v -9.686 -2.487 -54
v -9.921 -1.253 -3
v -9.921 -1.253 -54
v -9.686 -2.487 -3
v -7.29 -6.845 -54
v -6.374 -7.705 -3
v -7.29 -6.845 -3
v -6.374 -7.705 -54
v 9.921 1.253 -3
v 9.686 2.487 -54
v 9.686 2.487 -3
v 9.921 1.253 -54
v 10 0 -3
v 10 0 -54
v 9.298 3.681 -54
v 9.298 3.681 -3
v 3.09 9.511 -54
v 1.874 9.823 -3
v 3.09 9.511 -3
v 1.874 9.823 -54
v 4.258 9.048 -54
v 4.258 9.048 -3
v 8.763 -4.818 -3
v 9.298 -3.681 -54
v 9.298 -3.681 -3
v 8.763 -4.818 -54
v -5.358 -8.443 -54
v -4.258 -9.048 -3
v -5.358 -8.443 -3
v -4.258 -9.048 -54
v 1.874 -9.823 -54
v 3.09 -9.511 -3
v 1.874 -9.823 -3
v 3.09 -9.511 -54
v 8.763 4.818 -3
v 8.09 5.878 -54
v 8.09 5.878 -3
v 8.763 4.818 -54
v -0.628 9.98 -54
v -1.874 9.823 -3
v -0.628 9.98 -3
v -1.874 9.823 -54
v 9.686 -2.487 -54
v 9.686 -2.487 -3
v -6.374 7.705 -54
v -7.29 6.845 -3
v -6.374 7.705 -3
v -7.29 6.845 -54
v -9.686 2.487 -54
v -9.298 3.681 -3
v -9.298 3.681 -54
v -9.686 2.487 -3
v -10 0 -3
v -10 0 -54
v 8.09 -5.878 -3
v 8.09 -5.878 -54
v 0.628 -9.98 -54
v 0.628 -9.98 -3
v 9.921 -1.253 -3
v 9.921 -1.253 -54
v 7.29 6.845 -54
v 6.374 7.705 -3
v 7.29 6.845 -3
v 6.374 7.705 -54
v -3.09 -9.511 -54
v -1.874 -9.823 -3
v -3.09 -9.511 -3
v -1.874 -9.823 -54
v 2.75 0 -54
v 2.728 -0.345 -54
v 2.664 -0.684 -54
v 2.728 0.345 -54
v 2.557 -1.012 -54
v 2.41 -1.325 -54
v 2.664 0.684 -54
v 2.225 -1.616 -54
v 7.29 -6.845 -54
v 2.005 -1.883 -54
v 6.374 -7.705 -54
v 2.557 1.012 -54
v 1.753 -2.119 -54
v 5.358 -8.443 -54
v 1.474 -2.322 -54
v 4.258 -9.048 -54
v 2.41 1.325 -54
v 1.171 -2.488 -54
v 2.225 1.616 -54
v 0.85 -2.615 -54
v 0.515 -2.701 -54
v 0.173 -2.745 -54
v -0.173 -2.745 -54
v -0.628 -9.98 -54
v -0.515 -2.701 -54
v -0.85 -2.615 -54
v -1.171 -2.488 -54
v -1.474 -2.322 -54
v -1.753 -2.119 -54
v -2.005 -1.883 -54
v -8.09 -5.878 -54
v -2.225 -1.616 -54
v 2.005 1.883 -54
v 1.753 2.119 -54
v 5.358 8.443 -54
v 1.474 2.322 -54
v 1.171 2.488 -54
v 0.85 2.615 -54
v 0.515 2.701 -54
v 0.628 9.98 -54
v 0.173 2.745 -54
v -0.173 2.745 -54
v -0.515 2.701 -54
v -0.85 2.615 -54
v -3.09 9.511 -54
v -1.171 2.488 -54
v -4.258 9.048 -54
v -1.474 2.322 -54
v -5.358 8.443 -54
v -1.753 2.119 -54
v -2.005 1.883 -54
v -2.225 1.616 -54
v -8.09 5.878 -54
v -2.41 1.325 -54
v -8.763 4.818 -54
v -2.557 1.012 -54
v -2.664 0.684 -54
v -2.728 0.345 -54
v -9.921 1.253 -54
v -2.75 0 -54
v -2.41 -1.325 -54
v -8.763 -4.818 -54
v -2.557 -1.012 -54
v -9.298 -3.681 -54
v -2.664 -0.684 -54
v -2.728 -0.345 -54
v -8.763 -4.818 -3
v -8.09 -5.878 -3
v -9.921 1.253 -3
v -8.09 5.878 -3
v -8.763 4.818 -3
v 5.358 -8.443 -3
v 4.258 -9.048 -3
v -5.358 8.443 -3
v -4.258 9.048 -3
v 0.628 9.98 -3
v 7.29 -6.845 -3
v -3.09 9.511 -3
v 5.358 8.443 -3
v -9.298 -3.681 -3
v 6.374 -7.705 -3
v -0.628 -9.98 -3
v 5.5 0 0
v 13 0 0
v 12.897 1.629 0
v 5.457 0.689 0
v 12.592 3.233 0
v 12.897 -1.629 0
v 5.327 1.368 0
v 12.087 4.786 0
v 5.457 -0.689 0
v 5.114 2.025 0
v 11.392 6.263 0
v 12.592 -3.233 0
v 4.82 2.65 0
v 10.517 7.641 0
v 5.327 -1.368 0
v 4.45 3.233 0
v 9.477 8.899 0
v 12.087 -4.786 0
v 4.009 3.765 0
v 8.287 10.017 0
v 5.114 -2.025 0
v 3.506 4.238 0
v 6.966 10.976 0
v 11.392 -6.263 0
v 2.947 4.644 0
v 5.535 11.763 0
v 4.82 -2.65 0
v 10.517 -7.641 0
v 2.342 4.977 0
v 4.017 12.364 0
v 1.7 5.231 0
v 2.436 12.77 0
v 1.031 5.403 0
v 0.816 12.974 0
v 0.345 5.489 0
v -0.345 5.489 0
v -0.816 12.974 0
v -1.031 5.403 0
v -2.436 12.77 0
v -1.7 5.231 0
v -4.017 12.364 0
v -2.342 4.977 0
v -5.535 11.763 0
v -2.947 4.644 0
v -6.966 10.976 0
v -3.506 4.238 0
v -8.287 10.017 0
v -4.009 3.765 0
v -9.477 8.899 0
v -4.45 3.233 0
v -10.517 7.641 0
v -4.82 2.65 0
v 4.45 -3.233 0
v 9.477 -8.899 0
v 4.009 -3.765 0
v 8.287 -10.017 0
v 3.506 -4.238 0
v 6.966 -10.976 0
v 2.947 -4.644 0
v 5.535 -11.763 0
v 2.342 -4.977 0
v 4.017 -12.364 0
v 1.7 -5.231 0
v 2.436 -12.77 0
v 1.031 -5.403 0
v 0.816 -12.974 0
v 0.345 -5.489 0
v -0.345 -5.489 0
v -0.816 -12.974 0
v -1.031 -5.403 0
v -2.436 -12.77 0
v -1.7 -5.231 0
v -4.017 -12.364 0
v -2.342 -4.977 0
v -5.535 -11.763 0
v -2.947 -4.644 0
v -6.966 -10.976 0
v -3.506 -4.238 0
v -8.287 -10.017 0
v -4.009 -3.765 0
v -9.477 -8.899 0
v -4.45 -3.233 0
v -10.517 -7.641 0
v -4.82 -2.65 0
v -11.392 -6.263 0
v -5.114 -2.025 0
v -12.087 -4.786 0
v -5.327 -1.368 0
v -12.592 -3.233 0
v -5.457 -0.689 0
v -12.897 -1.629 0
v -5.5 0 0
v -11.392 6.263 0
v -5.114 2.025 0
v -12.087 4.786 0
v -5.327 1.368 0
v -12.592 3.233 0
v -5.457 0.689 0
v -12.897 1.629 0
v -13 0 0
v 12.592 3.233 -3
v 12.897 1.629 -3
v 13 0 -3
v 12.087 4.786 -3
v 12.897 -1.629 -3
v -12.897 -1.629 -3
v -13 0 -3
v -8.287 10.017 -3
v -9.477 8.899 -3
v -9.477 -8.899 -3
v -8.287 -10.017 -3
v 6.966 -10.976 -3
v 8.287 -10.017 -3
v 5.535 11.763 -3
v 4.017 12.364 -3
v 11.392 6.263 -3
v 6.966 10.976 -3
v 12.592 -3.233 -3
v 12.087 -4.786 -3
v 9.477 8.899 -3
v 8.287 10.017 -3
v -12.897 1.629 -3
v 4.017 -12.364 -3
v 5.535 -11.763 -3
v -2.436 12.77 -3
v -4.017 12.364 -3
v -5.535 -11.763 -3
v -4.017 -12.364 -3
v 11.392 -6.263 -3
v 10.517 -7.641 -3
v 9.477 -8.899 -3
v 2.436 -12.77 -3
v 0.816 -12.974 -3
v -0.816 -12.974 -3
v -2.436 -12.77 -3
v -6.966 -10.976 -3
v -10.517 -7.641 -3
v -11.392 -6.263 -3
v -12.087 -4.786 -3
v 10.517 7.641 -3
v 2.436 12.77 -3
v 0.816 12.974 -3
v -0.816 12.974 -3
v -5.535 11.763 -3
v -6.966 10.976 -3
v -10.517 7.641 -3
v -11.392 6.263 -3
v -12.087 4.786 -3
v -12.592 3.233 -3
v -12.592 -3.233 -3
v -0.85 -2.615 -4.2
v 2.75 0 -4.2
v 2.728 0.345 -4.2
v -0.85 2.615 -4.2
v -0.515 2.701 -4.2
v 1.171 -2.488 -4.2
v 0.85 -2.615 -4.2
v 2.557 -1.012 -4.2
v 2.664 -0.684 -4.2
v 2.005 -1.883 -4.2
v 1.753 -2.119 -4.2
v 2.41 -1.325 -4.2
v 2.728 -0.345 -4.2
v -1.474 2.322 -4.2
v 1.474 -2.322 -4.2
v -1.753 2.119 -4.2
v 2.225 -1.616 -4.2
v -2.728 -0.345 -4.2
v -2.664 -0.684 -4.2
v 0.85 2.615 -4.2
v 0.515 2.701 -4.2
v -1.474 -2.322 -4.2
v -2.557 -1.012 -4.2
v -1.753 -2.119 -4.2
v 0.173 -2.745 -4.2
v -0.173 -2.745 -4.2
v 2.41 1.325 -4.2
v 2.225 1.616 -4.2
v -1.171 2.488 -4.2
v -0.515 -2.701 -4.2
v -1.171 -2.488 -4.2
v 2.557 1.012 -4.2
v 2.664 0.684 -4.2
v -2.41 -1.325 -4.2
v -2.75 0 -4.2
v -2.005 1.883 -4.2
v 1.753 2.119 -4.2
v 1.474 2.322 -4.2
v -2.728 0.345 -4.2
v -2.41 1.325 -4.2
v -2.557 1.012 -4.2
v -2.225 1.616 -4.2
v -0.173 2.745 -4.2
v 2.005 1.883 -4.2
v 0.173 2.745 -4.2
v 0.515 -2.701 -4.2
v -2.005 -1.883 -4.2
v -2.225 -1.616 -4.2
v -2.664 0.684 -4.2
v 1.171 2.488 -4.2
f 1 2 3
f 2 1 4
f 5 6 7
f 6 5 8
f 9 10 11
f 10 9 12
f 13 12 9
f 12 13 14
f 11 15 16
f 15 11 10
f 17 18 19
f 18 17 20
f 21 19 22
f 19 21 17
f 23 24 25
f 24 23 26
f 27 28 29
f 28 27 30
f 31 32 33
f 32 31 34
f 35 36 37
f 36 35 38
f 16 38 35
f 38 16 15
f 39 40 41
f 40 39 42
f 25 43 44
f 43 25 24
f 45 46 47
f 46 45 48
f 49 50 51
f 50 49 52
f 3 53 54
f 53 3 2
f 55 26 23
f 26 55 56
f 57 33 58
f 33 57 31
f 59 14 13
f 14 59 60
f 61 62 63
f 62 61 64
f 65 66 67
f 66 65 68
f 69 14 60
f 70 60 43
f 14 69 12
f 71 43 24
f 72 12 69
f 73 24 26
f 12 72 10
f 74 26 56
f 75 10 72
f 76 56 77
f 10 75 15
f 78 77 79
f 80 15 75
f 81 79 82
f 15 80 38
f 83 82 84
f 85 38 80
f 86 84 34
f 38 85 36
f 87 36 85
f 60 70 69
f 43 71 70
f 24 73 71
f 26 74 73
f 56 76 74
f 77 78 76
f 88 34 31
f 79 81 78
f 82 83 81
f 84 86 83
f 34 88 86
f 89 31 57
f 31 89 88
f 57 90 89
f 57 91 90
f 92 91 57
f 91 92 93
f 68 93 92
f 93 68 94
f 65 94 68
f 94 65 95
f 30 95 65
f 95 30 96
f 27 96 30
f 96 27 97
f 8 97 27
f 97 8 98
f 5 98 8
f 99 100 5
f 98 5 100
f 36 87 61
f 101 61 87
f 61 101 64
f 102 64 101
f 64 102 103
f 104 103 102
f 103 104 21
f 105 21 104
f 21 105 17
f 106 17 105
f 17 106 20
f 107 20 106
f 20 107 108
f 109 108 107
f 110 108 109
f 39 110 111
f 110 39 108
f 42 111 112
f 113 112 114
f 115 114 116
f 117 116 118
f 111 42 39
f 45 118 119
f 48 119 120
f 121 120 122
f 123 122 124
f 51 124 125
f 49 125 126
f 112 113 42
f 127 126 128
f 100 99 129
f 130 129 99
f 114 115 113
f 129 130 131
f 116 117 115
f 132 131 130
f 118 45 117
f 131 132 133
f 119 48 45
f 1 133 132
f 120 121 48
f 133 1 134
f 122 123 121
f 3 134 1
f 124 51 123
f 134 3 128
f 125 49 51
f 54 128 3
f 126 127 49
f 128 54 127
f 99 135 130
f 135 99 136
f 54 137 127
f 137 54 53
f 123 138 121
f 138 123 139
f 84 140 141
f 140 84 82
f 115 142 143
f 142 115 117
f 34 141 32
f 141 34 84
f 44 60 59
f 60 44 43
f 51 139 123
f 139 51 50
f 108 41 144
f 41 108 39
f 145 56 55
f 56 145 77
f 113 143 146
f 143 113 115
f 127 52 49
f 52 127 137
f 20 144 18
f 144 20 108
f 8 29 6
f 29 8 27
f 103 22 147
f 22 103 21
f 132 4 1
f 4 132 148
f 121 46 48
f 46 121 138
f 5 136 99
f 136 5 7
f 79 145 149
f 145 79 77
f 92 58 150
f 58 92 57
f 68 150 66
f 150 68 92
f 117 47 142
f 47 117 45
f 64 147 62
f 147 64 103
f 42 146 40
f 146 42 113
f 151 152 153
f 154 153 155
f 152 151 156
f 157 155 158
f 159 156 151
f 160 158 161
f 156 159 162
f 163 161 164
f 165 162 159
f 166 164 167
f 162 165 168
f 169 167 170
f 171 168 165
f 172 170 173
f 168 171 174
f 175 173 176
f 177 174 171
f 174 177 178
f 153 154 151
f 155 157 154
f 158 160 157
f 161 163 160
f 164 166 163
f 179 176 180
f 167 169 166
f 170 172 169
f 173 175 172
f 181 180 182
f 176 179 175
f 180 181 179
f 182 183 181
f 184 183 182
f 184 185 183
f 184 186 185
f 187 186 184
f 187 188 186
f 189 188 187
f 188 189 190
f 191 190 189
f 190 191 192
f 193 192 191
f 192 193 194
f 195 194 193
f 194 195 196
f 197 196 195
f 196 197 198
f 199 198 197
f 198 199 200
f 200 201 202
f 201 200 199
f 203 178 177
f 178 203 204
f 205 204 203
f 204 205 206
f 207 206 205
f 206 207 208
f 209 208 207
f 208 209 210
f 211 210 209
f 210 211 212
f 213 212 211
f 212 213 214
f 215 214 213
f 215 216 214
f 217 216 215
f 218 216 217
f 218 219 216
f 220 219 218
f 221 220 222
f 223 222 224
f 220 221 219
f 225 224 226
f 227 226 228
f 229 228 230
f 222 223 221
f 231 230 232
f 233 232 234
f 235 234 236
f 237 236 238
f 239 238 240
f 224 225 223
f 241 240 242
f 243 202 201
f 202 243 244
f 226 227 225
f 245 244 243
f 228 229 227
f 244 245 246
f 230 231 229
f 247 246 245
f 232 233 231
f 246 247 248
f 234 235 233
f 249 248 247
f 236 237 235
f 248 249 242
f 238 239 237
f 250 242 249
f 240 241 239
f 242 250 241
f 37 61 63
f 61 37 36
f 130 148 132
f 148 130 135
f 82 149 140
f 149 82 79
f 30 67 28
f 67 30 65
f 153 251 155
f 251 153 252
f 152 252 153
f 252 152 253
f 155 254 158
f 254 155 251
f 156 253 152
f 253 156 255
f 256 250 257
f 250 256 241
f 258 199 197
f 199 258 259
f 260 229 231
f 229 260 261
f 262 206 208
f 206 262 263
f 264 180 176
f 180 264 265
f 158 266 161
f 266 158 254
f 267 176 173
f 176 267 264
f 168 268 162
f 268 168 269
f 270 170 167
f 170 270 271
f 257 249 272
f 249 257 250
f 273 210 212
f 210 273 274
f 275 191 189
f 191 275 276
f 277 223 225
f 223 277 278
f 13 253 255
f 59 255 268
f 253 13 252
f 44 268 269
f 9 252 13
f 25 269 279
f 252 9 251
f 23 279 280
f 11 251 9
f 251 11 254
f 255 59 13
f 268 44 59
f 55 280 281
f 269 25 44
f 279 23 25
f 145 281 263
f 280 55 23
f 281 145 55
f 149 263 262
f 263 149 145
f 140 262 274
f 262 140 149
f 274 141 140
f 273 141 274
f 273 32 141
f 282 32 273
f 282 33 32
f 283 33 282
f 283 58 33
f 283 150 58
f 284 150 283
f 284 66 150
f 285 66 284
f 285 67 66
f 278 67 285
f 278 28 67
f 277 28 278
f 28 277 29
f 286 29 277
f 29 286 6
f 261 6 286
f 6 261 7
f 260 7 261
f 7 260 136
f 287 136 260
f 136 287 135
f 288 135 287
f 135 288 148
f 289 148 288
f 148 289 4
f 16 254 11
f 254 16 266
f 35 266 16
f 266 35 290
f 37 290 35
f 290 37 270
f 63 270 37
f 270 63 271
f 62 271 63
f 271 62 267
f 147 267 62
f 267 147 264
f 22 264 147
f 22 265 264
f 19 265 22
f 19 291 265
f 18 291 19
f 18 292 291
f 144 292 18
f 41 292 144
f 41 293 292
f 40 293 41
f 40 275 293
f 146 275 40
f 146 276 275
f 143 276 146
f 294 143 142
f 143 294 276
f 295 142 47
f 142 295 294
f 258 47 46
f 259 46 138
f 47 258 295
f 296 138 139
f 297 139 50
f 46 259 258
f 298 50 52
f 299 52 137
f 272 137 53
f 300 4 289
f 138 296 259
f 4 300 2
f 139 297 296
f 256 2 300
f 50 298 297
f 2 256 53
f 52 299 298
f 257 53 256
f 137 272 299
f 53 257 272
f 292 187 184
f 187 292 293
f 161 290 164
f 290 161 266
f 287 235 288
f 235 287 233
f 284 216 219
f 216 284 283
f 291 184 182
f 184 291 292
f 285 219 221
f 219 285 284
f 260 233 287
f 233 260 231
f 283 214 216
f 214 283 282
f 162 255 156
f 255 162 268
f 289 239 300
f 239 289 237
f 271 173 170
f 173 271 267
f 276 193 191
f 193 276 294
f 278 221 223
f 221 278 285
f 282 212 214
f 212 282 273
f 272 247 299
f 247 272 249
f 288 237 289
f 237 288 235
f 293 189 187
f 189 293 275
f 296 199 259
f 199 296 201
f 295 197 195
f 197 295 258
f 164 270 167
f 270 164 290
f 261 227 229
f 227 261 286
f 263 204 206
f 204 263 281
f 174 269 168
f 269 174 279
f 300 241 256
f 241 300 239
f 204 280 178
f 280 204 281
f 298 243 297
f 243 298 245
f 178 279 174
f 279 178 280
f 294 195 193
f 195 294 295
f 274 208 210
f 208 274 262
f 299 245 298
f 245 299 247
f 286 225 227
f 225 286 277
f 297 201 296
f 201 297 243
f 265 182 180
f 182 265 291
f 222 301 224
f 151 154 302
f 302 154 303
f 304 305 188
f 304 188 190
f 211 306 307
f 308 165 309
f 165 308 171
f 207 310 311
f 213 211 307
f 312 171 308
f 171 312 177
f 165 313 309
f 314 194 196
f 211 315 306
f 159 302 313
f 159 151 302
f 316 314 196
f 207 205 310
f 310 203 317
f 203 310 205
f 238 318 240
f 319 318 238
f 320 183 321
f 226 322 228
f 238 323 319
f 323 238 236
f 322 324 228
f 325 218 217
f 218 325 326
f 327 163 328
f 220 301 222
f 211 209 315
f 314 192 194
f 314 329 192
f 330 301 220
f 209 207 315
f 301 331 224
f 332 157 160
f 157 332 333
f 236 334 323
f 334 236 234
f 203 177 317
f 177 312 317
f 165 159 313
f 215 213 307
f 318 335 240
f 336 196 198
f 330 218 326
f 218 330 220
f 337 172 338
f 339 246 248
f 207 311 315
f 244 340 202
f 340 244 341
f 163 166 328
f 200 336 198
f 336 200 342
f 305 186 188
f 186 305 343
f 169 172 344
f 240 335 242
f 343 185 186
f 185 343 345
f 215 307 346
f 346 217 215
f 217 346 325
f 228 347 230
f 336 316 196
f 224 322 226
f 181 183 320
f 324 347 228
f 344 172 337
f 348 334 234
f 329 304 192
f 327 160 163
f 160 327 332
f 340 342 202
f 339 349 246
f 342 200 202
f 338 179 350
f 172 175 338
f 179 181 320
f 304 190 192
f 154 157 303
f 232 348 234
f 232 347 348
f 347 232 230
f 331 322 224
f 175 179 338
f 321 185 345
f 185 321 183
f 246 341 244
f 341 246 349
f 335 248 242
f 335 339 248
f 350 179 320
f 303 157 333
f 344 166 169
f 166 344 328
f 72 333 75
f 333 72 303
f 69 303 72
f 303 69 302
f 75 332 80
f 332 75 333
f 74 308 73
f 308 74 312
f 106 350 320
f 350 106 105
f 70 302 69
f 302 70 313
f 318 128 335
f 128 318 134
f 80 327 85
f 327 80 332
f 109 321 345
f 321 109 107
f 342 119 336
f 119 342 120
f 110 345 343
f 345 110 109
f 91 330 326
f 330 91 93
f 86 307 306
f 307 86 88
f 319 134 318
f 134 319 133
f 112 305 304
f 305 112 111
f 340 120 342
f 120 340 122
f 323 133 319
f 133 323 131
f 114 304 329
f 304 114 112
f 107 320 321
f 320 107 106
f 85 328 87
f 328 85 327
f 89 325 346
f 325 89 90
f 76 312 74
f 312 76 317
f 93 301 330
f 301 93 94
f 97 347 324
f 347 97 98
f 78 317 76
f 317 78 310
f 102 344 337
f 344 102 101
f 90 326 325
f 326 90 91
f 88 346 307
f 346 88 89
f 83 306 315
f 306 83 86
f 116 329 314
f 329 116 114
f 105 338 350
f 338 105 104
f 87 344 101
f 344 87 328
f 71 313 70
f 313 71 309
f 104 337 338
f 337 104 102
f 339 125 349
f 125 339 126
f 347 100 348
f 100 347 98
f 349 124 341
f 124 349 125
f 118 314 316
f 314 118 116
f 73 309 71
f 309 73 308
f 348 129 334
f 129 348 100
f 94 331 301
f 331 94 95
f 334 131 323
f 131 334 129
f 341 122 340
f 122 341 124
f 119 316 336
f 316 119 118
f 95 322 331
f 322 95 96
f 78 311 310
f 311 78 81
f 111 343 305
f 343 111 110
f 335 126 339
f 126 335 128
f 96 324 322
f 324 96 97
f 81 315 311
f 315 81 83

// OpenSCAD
$fn = 50;


difference() {
	union() {
		translate(v = [0, 0, -54.0000000000]) {
			cylinder(h = 54, r = 10.0000000000);
		}
		translate(v = [0, 0, -3.0000000000]) {
			cylinder(h = 3, r = 13.0000000000);
		}
	}
	union() {
		translate(v = [0, 0, 0]) {
			rotate(a = [0, 0, 0]) {
				difference() {
					union() {
						#translate(v = [0, 0, -54.0000000000]) {
							cylinder(h = 54, r = 2.2500000000);
						}
						#translate(v = [0, 0, -4.2000000000]) {
							cylinder(h = 4.2000000000, r = 10.0000000000, r1 = 2.7500000000, r2 = 5.5000000000);
						}
						#translate(v = [0, 0, -54.0000000000]) {
							cylinder(h = 54, r = 2.7500000000);
						}
						#translate(v = [0, 0, -54.0000000000]) {
							cylinder(h = 54, r = 2.2500000000);
						}
					}
					union();
				}
			}
		}
	}
}
